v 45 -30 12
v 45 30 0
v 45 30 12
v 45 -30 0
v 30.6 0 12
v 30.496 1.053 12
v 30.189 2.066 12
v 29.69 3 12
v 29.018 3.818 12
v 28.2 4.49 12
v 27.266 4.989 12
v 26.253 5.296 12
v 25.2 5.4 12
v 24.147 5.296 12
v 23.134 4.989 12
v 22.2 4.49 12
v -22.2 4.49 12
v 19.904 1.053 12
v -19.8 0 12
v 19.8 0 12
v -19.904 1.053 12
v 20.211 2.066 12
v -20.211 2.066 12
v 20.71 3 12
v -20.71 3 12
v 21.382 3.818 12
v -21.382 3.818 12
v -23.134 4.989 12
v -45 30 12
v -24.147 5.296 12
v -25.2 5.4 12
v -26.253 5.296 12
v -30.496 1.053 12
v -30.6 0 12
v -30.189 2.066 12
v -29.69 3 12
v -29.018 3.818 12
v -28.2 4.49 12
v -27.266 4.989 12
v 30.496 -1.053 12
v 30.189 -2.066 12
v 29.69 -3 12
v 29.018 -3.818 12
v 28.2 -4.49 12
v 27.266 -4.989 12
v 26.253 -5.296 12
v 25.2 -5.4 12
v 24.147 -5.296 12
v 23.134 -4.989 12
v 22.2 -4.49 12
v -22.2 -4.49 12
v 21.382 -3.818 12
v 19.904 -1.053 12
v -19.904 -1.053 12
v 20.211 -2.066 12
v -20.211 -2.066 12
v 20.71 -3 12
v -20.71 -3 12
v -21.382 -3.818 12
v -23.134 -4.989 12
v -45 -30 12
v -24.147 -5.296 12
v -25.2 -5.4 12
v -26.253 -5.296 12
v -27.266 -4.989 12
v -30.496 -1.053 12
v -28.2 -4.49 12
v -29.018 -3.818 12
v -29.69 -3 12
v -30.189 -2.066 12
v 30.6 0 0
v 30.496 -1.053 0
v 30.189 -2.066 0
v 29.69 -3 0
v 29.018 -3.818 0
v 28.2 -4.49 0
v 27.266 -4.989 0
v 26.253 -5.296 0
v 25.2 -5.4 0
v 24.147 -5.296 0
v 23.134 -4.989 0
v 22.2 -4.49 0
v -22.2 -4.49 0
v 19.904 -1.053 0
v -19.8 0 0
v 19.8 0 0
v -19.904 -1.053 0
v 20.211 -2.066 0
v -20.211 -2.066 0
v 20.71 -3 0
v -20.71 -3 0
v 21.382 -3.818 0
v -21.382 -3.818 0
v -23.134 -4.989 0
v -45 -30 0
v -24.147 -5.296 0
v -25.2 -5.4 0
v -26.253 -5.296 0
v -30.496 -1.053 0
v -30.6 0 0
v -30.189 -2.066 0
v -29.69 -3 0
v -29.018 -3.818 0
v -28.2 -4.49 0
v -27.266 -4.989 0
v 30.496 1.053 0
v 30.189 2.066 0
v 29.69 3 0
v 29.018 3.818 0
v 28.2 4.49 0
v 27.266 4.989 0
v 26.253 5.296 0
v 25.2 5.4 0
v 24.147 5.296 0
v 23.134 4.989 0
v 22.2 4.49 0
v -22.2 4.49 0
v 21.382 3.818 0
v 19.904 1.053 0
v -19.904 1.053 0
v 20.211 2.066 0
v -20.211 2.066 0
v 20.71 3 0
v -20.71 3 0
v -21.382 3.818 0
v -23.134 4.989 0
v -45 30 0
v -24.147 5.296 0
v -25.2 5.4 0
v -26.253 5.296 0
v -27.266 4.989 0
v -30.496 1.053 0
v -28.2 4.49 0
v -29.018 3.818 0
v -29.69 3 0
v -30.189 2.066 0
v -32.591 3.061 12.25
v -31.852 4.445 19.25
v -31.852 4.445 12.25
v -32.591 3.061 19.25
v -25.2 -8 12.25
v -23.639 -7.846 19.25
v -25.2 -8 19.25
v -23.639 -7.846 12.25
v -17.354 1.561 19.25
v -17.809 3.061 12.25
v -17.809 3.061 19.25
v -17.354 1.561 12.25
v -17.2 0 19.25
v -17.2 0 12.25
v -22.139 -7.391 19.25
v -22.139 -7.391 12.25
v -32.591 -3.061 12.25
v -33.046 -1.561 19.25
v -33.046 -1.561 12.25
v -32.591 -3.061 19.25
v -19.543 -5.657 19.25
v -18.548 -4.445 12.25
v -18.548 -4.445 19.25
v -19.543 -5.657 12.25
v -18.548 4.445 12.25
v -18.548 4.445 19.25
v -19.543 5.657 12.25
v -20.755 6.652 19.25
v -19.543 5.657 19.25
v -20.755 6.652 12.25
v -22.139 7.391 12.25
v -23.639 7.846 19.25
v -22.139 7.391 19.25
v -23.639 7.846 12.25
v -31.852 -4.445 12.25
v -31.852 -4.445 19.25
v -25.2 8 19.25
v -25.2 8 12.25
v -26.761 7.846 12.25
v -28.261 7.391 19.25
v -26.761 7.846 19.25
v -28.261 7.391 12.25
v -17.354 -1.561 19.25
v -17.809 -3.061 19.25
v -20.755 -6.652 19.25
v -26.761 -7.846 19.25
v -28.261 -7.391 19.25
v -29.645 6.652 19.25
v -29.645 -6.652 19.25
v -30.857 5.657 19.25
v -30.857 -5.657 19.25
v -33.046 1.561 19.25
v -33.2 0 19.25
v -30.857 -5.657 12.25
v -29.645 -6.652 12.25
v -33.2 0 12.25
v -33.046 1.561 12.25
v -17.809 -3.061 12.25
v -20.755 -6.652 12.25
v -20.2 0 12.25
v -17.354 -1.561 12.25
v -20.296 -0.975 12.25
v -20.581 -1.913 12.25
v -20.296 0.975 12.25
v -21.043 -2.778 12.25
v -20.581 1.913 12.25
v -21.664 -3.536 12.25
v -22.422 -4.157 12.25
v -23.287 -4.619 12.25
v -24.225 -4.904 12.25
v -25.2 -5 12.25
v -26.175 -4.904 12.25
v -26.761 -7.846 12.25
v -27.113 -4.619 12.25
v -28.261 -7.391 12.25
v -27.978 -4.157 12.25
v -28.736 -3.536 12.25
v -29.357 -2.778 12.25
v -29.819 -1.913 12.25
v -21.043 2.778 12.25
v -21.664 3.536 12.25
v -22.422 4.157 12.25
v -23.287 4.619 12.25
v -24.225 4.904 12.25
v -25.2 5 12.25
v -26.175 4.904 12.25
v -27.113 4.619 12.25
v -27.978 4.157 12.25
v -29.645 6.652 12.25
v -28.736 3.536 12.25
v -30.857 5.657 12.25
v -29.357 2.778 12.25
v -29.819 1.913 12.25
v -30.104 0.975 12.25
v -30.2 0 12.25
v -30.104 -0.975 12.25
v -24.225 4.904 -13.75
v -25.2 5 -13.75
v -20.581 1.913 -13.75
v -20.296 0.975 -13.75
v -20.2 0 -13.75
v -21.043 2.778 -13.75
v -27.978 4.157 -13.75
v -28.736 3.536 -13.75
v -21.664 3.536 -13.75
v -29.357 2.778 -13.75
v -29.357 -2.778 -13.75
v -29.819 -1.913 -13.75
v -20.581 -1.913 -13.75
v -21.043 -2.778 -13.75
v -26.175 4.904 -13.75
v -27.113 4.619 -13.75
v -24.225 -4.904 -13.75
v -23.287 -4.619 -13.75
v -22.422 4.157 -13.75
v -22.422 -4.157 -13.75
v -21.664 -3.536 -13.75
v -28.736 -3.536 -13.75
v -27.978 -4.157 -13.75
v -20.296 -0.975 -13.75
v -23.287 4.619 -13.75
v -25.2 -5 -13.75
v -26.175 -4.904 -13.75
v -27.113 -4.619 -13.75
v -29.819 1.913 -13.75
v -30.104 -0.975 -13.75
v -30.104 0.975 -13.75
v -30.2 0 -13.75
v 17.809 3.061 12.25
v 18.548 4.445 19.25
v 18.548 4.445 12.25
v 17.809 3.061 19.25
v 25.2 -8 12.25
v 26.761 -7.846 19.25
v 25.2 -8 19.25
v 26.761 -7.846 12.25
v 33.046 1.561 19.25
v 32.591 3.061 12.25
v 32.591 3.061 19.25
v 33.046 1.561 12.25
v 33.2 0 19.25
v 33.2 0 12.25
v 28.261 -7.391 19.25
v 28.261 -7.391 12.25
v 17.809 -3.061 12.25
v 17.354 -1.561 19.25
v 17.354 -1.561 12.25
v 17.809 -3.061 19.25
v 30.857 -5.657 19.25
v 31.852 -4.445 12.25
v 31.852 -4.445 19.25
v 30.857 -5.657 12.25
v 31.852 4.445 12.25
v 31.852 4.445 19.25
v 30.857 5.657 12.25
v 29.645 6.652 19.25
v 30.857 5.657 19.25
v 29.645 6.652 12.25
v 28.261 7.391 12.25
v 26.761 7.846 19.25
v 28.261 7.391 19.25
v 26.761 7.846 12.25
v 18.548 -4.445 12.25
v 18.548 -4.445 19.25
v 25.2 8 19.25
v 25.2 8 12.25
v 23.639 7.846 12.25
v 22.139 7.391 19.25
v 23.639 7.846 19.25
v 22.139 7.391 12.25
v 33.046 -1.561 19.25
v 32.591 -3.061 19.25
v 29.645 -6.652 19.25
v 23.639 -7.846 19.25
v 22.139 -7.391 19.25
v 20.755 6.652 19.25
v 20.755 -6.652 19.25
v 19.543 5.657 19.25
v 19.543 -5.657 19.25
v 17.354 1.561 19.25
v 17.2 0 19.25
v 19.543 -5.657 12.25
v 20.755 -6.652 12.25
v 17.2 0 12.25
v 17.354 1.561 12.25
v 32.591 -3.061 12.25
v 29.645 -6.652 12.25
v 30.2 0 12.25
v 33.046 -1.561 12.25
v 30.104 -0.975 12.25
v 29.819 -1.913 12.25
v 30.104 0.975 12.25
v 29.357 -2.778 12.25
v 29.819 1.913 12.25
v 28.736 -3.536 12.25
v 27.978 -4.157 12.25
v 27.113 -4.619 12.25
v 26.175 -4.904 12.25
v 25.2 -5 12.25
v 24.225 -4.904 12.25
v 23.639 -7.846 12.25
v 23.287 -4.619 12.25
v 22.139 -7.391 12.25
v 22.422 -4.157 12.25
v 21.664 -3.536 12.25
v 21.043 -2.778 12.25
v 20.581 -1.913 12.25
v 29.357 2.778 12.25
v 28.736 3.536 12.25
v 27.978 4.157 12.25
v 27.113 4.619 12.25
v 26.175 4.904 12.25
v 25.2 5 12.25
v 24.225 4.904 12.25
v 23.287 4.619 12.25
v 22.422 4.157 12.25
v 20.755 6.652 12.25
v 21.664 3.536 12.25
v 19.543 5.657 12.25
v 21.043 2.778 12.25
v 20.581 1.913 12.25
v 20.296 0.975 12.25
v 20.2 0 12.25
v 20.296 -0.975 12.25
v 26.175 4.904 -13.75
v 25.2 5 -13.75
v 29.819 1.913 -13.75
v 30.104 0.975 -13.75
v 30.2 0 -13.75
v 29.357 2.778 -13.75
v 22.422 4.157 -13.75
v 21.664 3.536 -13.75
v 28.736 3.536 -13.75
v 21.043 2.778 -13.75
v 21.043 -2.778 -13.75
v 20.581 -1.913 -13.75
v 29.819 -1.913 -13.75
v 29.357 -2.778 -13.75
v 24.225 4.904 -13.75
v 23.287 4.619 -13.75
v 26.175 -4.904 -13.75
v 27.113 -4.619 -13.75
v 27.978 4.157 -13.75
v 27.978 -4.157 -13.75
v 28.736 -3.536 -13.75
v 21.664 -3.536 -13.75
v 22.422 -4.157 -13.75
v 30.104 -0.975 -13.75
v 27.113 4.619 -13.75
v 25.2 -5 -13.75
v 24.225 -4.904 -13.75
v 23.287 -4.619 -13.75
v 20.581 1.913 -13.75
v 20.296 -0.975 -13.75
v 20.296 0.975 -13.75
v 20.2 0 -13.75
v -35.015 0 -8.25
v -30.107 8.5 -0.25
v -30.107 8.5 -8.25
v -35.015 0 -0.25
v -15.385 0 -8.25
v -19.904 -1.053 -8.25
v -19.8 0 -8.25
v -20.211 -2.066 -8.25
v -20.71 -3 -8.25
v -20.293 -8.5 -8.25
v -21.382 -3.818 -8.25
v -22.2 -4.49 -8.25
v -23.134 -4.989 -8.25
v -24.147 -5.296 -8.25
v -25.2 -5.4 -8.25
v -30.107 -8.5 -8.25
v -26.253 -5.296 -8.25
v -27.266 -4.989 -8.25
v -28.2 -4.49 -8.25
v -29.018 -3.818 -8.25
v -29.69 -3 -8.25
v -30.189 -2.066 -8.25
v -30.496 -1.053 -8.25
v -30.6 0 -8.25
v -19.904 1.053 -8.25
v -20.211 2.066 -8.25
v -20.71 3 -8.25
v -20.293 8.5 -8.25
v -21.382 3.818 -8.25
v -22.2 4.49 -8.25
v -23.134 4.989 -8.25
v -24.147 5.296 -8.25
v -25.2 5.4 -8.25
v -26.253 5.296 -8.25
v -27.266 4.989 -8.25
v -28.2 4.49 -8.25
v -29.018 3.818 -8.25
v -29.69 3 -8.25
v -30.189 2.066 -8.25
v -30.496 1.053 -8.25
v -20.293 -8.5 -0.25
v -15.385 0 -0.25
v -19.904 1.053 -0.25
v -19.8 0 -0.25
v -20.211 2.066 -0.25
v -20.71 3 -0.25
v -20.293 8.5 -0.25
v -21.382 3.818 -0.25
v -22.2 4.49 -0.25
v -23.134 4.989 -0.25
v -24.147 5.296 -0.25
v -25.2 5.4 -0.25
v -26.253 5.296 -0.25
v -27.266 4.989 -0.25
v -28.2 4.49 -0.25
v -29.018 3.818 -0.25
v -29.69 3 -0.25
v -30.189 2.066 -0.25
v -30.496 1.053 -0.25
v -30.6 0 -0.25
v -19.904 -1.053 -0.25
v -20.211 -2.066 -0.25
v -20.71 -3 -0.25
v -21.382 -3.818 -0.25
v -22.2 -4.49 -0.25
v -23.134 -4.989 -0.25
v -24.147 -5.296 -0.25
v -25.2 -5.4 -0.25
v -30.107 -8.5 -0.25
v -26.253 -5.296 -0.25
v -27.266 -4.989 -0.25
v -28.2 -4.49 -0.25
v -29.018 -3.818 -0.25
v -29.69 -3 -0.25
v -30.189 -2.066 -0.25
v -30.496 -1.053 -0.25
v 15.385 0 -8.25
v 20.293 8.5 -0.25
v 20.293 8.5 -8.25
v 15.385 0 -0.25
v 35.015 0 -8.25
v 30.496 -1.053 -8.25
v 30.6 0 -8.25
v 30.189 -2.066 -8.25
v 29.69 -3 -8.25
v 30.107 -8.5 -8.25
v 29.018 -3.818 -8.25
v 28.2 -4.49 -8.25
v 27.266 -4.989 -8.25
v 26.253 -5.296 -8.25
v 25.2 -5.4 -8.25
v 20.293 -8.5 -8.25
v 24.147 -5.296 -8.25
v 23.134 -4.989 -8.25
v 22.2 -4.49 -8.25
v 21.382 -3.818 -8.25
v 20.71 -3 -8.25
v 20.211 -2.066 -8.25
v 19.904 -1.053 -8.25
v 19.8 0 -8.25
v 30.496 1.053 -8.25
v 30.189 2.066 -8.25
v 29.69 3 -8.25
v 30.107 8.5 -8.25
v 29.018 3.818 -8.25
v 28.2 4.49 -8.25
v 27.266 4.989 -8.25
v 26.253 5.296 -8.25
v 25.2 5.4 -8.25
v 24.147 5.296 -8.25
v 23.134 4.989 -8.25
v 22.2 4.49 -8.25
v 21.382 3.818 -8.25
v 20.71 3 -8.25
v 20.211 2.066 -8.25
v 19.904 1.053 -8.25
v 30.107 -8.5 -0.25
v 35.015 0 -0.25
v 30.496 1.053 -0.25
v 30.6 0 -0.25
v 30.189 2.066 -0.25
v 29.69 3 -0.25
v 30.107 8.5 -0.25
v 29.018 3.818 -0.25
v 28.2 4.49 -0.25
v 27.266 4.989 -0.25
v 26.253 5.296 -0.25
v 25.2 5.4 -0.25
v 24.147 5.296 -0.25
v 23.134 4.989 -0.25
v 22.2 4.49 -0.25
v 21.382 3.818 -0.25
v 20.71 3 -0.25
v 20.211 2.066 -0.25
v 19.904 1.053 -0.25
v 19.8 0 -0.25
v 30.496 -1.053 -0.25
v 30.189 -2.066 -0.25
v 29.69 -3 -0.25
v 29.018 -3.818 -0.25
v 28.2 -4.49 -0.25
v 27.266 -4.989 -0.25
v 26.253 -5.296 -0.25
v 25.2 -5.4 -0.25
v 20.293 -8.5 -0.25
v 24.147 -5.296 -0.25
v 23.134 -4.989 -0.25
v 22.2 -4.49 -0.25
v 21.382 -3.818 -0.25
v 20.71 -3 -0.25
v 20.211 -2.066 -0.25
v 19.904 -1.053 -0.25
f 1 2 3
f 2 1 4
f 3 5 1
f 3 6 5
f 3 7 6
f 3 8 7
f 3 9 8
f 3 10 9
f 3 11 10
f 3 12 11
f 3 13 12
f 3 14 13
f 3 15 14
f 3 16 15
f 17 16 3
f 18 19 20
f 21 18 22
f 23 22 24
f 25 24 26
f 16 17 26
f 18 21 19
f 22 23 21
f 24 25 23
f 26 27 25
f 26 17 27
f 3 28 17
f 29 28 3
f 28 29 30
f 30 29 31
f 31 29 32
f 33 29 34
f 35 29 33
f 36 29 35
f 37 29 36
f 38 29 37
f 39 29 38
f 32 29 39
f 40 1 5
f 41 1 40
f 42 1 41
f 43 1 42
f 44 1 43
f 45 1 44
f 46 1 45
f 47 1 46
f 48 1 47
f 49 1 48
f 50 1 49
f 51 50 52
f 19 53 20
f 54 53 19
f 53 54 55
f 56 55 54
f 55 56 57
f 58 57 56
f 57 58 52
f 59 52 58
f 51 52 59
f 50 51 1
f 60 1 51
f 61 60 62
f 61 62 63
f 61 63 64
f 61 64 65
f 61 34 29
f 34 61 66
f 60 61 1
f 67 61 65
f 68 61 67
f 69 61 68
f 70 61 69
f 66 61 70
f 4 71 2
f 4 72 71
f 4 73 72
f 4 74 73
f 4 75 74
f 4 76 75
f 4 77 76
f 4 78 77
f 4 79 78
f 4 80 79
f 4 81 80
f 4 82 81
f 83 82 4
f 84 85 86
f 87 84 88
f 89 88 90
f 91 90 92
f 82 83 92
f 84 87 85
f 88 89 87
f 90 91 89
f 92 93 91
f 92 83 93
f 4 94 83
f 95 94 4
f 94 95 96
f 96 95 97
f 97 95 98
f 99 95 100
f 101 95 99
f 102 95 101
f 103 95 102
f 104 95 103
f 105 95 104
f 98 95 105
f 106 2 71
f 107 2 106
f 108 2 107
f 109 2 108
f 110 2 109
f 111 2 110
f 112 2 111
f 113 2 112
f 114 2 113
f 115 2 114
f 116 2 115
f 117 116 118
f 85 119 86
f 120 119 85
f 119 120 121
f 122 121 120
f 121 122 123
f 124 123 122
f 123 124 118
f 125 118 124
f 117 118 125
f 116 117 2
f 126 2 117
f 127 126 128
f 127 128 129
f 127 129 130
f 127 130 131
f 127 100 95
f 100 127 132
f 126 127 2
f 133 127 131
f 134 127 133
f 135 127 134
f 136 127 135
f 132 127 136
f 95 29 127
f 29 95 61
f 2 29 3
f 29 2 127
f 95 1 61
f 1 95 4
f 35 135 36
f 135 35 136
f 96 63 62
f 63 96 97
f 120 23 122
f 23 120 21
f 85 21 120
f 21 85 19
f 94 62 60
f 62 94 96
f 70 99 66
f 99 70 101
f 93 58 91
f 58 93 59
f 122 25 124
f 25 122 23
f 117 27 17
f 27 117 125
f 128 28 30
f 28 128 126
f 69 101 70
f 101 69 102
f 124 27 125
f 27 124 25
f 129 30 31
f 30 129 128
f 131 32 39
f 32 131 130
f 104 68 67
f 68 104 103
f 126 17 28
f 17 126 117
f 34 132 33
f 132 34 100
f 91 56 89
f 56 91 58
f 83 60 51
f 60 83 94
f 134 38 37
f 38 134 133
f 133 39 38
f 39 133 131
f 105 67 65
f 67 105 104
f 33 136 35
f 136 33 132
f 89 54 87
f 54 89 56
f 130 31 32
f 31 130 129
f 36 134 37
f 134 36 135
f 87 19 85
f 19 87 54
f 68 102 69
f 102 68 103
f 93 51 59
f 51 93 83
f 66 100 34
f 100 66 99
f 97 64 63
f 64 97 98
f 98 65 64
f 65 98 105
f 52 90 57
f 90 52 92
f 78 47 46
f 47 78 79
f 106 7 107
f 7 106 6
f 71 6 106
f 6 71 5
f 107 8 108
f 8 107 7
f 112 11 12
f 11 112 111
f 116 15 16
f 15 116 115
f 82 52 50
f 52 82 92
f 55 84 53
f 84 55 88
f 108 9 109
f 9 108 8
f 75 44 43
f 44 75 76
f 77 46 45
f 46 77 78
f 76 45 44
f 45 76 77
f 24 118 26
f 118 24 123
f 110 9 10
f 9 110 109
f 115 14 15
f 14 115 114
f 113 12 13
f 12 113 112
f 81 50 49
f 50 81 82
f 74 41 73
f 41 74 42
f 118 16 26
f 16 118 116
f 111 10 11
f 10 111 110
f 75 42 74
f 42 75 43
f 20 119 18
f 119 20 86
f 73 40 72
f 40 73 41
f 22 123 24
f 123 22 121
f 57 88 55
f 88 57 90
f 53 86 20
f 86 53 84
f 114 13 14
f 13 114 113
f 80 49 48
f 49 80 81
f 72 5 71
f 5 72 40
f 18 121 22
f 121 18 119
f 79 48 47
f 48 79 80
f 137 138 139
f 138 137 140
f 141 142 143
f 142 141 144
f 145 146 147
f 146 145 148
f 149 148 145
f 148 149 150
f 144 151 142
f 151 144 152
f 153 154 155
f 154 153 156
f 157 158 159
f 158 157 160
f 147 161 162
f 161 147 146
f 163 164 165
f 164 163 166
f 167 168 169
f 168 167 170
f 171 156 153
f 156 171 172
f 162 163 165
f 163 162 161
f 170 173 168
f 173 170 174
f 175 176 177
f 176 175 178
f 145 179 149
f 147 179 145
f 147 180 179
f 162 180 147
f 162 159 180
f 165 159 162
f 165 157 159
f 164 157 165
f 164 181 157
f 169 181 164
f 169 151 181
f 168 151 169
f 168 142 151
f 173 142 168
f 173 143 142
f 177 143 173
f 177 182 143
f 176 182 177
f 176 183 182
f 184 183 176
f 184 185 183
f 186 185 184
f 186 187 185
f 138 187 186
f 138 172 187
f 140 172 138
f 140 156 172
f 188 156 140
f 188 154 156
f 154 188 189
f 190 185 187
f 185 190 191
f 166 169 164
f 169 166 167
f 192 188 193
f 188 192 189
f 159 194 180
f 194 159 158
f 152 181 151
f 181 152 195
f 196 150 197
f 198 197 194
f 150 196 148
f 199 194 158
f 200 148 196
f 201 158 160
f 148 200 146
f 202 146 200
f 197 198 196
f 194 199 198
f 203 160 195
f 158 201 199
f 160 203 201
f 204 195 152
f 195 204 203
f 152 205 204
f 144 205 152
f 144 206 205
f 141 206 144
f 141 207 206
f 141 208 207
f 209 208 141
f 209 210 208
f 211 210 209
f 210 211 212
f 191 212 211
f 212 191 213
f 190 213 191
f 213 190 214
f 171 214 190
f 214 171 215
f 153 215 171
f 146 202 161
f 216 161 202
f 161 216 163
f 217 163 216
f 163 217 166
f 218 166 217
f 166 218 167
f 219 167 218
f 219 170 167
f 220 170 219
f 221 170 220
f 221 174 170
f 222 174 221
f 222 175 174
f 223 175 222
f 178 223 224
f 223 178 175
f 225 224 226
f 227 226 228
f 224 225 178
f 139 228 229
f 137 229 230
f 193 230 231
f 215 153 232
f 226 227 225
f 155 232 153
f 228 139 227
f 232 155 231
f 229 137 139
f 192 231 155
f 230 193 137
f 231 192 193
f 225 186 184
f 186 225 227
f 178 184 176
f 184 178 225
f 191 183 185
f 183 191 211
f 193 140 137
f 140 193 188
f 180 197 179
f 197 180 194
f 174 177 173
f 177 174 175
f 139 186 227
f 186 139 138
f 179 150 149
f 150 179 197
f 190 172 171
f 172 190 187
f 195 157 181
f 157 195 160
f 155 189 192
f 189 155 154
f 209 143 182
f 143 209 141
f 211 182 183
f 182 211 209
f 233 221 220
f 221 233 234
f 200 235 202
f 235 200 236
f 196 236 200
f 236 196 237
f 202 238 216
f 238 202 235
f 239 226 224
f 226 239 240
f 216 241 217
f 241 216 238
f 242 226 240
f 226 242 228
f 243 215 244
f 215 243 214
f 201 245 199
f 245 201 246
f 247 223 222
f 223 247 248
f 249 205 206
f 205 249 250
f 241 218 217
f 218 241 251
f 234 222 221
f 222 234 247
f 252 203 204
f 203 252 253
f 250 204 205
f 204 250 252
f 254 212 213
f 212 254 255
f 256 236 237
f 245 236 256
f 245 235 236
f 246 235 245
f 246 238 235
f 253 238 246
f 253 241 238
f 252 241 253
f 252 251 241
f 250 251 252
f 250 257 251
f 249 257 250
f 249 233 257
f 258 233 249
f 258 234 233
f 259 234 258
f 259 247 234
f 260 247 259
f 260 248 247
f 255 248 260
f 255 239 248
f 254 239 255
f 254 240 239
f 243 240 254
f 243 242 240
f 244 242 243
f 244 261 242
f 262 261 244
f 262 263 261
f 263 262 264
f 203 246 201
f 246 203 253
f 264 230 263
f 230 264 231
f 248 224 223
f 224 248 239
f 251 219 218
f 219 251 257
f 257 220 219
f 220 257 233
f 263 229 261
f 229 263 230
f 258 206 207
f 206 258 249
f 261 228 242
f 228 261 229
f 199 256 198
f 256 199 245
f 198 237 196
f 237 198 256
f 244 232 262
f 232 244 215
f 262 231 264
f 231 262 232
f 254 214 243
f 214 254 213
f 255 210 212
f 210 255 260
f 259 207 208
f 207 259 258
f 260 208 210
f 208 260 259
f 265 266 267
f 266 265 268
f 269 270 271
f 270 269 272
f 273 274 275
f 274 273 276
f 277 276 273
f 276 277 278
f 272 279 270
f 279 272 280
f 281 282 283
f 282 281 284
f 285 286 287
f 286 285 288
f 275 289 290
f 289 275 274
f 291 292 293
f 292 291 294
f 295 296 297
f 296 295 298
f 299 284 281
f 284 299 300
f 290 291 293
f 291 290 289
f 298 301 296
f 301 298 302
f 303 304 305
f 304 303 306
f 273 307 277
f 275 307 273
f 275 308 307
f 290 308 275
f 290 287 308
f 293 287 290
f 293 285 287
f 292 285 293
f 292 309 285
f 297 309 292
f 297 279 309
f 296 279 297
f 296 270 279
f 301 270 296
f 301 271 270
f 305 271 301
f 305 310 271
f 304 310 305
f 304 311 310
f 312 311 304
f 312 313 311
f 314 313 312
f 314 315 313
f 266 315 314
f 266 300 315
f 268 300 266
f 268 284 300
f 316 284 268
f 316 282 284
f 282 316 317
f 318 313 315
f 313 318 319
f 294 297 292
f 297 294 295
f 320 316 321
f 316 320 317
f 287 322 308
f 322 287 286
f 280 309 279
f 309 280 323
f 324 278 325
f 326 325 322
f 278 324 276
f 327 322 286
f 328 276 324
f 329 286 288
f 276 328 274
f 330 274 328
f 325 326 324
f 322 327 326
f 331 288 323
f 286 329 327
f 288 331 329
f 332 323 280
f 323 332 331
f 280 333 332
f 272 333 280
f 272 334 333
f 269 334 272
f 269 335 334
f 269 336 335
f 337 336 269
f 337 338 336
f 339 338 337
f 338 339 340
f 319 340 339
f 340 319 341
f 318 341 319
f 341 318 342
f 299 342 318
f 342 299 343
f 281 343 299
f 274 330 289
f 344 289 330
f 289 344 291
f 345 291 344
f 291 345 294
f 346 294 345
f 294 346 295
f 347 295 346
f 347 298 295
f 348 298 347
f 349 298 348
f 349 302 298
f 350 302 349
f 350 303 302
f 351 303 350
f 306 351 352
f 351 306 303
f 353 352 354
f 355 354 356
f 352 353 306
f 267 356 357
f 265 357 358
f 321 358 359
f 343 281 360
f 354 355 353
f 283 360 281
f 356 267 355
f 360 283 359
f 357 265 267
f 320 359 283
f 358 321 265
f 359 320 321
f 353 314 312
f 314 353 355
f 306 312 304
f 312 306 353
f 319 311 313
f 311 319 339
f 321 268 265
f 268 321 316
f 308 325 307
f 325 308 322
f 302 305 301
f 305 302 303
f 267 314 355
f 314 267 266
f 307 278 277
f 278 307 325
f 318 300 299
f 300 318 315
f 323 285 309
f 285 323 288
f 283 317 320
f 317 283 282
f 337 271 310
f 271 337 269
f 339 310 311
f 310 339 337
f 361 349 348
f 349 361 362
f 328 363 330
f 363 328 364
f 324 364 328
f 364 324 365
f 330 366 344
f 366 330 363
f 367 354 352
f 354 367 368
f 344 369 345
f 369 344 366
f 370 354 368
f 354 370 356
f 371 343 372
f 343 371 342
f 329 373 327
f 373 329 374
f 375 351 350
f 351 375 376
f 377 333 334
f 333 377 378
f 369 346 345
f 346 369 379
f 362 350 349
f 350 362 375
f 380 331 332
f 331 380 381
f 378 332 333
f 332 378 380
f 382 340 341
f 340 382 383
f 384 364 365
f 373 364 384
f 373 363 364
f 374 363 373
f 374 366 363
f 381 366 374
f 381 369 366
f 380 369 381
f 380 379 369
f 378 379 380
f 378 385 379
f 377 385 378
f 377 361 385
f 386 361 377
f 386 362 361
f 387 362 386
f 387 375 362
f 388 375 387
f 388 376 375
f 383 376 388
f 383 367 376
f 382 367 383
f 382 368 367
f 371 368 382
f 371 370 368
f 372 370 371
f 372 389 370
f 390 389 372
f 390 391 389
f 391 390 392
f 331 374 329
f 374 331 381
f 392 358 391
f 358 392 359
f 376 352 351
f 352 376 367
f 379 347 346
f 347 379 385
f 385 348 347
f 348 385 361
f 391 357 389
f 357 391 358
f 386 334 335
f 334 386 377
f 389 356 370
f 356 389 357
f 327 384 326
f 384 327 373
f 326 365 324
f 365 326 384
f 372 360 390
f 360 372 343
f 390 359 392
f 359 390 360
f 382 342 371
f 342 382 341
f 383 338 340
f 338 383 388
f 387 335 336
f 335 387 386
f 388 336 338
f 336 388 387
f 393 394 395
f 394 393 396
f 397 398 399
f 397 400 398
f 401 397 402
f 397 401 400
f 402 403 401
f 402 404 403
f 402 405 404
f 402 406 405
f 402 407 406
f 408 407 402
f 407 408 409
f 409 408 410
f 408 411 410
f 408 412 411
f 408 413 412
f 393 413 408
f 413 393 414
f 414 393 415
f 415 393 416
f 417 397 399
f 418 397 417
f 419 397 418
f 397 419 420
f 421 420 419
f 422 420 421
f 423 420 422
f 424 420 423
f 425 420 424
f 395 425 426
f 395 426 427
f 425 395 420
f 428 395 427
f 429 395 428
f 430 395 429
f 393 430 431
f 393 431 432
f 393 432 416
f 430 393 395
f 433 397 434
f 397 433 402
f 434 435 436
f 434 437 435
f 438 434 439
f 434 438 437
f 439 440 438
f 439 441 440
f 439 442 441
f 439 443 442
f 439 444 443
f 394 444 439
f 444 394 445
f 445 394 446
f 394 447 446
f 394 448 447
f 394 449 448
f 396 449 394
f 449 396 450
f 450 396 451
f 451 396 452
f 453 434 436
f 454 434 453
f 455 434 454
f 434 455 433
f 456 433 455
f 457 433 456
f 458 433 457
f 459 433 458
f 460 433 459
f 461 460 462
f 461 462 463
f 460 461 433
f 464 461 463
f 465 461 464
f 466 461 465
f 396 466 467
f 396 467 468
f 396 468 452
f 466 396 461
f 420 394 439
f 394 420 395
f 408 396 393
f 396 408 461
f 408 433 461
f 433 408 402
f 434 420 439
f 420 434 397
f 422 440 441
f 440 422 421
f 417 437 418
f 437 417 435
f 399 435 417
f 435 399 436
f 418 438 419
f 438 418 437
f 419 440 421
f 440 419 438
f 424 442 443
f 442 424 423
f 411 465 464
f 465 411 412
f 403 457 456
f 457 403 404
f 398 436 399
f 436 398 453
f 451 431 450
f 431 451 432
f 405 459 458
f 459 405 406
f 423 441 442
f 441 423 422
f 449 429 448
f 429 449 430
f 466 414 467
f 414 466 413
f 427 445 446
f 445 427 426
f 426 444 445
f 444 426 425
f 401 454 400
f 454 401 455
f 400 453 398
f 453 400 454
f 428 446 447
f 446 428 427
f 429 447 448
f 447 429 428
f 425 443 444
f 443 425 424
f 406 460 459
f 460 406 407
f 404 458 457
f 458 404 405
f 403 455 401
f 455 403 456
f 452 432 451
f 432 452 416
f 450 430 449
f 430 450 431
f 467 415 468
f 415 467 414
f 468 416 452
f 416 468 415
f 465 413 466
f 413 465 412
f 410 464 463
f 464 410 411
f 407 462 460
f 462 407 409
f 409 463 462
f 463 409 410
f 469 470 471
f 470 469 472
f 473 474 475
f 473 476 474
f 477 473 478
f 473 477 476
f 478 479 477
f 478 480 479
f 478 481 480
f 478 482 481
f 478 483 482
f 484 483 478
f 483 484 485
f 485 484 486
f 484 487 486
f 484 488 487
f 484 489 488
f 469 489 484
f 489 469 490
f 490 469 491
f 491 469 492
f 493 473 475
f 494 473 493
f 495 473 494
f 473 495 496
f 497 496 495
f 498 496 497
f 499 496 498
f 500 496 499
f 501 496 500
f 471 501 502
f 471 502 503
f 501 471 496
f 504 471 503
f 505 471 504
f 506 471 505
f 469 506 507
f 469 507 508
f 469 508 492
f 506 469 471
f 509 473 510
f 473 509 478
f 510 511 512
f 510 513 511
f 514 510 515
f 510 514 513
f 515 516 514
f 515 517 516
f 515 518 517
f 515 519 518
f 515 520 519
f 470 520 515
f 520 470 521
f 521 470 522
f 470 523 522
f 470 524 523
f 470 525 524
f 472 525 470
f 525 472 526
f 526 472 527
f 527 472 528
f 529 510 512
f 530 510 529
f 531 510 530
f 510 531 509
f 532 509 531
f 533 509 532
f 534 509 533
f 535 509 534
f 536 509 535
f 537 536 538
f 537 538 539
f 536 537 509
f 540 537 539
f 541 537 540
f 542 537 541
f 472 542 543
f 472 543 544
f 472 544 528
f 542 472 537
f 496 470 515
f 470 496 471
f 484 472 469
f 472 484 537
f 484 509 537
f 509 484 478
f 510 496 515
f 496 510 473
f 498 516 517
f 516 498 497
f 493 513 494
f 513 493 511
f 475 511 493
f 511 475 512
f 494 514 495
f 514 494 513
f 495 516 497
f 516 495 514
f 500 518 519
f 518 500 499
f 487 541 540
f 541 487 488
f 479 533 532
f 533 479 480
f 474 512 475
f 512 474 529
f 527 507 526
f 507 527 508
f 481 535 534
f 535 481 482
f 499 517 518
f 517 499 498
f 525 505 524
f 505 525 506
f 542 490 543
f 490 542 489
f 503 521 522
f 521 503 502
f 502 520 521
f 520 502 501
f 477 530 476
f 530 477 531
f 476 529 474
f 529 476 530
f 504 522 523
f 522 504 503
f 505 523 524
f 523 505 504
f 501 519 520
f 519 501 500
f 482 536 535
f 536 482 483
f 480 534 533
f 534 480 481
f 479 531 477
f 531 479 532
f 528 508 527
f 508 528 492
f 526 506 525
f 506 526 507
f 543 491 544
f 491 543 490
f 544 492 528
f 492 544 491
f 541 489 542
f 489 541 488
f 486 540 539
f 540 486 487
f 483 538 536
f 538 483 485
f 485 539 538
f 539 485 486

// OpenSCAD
$fn = 32;

// ------------------------------------------------------------------------
// Bolted plate: 90 x 60 x 12 mm plate, 2 fasteners
// Every part is its own module, assembly() places them once.
// ------------------------------------------------------------------------

// --- part 1 ---
module plate() {
  difference() {
    translate([-45, -30, 0]) cube([90, 60, 12]);
    translate([-25.2, 0, -1]) cylinder(h = 14, d = 10.8);
    translate([25.2, 0, -1]) cylinder(h = 14, d = 10.8);
  }
}

// --- part 2 ---
module bolt1() {
  cylinder(h = 7, d = 16);
  translate([0, 0, -26]) cylinder(h = 26, d = 10);
}

// --- part 3 ---
module bolt2() {
  cylinder(h = 7, d = 16);
  translate([0, 0, -26]) cylinder(h = 26, d = 10);
}

// --- part 4 ---
module nut1() {
  difference() {
    linear_extrude(height = 8) polygon(points = [[9.815, 0], [4.907, 8.5], [-4.907, 8.5], [-9.815, 0], [-4.907, -8.5], [4.907, -8.5]]);
    translate([0, 0, -1]) cylinder(h = 10, d = 10.8);
  }
}

// --- part 5 ---
module nut2() {
  difference() {
    linear_extrude(height = 8) polygon(points = [[9.815, 0], [4.907, 8.5], [-4.907, 8.5], [-9.815, 0], [-4.907, -8.5], [4.907, -8.5]]);
    translate([0, 0, -1]) cylinder(h = 10, d = 10.8);
  }
}

// --- assembly ---
module assembly() {
  translate([0, 0, 0]) rotate([0, 0, 0]) plate();
  translate([-25.2, 0, 12.25]) rotate([0, 0, 0]) bolt1();
  translate([25.2, 0, 12.25]) rotate([0, 0, 0]) bolt2();
  translate([-25.2, 0, -8.25]) rotate([0, 0, 0]) nut1();
  translate([25.2, 0, -8.25]) rotate([0, 0, 0]) nut2();
}

assembly();
